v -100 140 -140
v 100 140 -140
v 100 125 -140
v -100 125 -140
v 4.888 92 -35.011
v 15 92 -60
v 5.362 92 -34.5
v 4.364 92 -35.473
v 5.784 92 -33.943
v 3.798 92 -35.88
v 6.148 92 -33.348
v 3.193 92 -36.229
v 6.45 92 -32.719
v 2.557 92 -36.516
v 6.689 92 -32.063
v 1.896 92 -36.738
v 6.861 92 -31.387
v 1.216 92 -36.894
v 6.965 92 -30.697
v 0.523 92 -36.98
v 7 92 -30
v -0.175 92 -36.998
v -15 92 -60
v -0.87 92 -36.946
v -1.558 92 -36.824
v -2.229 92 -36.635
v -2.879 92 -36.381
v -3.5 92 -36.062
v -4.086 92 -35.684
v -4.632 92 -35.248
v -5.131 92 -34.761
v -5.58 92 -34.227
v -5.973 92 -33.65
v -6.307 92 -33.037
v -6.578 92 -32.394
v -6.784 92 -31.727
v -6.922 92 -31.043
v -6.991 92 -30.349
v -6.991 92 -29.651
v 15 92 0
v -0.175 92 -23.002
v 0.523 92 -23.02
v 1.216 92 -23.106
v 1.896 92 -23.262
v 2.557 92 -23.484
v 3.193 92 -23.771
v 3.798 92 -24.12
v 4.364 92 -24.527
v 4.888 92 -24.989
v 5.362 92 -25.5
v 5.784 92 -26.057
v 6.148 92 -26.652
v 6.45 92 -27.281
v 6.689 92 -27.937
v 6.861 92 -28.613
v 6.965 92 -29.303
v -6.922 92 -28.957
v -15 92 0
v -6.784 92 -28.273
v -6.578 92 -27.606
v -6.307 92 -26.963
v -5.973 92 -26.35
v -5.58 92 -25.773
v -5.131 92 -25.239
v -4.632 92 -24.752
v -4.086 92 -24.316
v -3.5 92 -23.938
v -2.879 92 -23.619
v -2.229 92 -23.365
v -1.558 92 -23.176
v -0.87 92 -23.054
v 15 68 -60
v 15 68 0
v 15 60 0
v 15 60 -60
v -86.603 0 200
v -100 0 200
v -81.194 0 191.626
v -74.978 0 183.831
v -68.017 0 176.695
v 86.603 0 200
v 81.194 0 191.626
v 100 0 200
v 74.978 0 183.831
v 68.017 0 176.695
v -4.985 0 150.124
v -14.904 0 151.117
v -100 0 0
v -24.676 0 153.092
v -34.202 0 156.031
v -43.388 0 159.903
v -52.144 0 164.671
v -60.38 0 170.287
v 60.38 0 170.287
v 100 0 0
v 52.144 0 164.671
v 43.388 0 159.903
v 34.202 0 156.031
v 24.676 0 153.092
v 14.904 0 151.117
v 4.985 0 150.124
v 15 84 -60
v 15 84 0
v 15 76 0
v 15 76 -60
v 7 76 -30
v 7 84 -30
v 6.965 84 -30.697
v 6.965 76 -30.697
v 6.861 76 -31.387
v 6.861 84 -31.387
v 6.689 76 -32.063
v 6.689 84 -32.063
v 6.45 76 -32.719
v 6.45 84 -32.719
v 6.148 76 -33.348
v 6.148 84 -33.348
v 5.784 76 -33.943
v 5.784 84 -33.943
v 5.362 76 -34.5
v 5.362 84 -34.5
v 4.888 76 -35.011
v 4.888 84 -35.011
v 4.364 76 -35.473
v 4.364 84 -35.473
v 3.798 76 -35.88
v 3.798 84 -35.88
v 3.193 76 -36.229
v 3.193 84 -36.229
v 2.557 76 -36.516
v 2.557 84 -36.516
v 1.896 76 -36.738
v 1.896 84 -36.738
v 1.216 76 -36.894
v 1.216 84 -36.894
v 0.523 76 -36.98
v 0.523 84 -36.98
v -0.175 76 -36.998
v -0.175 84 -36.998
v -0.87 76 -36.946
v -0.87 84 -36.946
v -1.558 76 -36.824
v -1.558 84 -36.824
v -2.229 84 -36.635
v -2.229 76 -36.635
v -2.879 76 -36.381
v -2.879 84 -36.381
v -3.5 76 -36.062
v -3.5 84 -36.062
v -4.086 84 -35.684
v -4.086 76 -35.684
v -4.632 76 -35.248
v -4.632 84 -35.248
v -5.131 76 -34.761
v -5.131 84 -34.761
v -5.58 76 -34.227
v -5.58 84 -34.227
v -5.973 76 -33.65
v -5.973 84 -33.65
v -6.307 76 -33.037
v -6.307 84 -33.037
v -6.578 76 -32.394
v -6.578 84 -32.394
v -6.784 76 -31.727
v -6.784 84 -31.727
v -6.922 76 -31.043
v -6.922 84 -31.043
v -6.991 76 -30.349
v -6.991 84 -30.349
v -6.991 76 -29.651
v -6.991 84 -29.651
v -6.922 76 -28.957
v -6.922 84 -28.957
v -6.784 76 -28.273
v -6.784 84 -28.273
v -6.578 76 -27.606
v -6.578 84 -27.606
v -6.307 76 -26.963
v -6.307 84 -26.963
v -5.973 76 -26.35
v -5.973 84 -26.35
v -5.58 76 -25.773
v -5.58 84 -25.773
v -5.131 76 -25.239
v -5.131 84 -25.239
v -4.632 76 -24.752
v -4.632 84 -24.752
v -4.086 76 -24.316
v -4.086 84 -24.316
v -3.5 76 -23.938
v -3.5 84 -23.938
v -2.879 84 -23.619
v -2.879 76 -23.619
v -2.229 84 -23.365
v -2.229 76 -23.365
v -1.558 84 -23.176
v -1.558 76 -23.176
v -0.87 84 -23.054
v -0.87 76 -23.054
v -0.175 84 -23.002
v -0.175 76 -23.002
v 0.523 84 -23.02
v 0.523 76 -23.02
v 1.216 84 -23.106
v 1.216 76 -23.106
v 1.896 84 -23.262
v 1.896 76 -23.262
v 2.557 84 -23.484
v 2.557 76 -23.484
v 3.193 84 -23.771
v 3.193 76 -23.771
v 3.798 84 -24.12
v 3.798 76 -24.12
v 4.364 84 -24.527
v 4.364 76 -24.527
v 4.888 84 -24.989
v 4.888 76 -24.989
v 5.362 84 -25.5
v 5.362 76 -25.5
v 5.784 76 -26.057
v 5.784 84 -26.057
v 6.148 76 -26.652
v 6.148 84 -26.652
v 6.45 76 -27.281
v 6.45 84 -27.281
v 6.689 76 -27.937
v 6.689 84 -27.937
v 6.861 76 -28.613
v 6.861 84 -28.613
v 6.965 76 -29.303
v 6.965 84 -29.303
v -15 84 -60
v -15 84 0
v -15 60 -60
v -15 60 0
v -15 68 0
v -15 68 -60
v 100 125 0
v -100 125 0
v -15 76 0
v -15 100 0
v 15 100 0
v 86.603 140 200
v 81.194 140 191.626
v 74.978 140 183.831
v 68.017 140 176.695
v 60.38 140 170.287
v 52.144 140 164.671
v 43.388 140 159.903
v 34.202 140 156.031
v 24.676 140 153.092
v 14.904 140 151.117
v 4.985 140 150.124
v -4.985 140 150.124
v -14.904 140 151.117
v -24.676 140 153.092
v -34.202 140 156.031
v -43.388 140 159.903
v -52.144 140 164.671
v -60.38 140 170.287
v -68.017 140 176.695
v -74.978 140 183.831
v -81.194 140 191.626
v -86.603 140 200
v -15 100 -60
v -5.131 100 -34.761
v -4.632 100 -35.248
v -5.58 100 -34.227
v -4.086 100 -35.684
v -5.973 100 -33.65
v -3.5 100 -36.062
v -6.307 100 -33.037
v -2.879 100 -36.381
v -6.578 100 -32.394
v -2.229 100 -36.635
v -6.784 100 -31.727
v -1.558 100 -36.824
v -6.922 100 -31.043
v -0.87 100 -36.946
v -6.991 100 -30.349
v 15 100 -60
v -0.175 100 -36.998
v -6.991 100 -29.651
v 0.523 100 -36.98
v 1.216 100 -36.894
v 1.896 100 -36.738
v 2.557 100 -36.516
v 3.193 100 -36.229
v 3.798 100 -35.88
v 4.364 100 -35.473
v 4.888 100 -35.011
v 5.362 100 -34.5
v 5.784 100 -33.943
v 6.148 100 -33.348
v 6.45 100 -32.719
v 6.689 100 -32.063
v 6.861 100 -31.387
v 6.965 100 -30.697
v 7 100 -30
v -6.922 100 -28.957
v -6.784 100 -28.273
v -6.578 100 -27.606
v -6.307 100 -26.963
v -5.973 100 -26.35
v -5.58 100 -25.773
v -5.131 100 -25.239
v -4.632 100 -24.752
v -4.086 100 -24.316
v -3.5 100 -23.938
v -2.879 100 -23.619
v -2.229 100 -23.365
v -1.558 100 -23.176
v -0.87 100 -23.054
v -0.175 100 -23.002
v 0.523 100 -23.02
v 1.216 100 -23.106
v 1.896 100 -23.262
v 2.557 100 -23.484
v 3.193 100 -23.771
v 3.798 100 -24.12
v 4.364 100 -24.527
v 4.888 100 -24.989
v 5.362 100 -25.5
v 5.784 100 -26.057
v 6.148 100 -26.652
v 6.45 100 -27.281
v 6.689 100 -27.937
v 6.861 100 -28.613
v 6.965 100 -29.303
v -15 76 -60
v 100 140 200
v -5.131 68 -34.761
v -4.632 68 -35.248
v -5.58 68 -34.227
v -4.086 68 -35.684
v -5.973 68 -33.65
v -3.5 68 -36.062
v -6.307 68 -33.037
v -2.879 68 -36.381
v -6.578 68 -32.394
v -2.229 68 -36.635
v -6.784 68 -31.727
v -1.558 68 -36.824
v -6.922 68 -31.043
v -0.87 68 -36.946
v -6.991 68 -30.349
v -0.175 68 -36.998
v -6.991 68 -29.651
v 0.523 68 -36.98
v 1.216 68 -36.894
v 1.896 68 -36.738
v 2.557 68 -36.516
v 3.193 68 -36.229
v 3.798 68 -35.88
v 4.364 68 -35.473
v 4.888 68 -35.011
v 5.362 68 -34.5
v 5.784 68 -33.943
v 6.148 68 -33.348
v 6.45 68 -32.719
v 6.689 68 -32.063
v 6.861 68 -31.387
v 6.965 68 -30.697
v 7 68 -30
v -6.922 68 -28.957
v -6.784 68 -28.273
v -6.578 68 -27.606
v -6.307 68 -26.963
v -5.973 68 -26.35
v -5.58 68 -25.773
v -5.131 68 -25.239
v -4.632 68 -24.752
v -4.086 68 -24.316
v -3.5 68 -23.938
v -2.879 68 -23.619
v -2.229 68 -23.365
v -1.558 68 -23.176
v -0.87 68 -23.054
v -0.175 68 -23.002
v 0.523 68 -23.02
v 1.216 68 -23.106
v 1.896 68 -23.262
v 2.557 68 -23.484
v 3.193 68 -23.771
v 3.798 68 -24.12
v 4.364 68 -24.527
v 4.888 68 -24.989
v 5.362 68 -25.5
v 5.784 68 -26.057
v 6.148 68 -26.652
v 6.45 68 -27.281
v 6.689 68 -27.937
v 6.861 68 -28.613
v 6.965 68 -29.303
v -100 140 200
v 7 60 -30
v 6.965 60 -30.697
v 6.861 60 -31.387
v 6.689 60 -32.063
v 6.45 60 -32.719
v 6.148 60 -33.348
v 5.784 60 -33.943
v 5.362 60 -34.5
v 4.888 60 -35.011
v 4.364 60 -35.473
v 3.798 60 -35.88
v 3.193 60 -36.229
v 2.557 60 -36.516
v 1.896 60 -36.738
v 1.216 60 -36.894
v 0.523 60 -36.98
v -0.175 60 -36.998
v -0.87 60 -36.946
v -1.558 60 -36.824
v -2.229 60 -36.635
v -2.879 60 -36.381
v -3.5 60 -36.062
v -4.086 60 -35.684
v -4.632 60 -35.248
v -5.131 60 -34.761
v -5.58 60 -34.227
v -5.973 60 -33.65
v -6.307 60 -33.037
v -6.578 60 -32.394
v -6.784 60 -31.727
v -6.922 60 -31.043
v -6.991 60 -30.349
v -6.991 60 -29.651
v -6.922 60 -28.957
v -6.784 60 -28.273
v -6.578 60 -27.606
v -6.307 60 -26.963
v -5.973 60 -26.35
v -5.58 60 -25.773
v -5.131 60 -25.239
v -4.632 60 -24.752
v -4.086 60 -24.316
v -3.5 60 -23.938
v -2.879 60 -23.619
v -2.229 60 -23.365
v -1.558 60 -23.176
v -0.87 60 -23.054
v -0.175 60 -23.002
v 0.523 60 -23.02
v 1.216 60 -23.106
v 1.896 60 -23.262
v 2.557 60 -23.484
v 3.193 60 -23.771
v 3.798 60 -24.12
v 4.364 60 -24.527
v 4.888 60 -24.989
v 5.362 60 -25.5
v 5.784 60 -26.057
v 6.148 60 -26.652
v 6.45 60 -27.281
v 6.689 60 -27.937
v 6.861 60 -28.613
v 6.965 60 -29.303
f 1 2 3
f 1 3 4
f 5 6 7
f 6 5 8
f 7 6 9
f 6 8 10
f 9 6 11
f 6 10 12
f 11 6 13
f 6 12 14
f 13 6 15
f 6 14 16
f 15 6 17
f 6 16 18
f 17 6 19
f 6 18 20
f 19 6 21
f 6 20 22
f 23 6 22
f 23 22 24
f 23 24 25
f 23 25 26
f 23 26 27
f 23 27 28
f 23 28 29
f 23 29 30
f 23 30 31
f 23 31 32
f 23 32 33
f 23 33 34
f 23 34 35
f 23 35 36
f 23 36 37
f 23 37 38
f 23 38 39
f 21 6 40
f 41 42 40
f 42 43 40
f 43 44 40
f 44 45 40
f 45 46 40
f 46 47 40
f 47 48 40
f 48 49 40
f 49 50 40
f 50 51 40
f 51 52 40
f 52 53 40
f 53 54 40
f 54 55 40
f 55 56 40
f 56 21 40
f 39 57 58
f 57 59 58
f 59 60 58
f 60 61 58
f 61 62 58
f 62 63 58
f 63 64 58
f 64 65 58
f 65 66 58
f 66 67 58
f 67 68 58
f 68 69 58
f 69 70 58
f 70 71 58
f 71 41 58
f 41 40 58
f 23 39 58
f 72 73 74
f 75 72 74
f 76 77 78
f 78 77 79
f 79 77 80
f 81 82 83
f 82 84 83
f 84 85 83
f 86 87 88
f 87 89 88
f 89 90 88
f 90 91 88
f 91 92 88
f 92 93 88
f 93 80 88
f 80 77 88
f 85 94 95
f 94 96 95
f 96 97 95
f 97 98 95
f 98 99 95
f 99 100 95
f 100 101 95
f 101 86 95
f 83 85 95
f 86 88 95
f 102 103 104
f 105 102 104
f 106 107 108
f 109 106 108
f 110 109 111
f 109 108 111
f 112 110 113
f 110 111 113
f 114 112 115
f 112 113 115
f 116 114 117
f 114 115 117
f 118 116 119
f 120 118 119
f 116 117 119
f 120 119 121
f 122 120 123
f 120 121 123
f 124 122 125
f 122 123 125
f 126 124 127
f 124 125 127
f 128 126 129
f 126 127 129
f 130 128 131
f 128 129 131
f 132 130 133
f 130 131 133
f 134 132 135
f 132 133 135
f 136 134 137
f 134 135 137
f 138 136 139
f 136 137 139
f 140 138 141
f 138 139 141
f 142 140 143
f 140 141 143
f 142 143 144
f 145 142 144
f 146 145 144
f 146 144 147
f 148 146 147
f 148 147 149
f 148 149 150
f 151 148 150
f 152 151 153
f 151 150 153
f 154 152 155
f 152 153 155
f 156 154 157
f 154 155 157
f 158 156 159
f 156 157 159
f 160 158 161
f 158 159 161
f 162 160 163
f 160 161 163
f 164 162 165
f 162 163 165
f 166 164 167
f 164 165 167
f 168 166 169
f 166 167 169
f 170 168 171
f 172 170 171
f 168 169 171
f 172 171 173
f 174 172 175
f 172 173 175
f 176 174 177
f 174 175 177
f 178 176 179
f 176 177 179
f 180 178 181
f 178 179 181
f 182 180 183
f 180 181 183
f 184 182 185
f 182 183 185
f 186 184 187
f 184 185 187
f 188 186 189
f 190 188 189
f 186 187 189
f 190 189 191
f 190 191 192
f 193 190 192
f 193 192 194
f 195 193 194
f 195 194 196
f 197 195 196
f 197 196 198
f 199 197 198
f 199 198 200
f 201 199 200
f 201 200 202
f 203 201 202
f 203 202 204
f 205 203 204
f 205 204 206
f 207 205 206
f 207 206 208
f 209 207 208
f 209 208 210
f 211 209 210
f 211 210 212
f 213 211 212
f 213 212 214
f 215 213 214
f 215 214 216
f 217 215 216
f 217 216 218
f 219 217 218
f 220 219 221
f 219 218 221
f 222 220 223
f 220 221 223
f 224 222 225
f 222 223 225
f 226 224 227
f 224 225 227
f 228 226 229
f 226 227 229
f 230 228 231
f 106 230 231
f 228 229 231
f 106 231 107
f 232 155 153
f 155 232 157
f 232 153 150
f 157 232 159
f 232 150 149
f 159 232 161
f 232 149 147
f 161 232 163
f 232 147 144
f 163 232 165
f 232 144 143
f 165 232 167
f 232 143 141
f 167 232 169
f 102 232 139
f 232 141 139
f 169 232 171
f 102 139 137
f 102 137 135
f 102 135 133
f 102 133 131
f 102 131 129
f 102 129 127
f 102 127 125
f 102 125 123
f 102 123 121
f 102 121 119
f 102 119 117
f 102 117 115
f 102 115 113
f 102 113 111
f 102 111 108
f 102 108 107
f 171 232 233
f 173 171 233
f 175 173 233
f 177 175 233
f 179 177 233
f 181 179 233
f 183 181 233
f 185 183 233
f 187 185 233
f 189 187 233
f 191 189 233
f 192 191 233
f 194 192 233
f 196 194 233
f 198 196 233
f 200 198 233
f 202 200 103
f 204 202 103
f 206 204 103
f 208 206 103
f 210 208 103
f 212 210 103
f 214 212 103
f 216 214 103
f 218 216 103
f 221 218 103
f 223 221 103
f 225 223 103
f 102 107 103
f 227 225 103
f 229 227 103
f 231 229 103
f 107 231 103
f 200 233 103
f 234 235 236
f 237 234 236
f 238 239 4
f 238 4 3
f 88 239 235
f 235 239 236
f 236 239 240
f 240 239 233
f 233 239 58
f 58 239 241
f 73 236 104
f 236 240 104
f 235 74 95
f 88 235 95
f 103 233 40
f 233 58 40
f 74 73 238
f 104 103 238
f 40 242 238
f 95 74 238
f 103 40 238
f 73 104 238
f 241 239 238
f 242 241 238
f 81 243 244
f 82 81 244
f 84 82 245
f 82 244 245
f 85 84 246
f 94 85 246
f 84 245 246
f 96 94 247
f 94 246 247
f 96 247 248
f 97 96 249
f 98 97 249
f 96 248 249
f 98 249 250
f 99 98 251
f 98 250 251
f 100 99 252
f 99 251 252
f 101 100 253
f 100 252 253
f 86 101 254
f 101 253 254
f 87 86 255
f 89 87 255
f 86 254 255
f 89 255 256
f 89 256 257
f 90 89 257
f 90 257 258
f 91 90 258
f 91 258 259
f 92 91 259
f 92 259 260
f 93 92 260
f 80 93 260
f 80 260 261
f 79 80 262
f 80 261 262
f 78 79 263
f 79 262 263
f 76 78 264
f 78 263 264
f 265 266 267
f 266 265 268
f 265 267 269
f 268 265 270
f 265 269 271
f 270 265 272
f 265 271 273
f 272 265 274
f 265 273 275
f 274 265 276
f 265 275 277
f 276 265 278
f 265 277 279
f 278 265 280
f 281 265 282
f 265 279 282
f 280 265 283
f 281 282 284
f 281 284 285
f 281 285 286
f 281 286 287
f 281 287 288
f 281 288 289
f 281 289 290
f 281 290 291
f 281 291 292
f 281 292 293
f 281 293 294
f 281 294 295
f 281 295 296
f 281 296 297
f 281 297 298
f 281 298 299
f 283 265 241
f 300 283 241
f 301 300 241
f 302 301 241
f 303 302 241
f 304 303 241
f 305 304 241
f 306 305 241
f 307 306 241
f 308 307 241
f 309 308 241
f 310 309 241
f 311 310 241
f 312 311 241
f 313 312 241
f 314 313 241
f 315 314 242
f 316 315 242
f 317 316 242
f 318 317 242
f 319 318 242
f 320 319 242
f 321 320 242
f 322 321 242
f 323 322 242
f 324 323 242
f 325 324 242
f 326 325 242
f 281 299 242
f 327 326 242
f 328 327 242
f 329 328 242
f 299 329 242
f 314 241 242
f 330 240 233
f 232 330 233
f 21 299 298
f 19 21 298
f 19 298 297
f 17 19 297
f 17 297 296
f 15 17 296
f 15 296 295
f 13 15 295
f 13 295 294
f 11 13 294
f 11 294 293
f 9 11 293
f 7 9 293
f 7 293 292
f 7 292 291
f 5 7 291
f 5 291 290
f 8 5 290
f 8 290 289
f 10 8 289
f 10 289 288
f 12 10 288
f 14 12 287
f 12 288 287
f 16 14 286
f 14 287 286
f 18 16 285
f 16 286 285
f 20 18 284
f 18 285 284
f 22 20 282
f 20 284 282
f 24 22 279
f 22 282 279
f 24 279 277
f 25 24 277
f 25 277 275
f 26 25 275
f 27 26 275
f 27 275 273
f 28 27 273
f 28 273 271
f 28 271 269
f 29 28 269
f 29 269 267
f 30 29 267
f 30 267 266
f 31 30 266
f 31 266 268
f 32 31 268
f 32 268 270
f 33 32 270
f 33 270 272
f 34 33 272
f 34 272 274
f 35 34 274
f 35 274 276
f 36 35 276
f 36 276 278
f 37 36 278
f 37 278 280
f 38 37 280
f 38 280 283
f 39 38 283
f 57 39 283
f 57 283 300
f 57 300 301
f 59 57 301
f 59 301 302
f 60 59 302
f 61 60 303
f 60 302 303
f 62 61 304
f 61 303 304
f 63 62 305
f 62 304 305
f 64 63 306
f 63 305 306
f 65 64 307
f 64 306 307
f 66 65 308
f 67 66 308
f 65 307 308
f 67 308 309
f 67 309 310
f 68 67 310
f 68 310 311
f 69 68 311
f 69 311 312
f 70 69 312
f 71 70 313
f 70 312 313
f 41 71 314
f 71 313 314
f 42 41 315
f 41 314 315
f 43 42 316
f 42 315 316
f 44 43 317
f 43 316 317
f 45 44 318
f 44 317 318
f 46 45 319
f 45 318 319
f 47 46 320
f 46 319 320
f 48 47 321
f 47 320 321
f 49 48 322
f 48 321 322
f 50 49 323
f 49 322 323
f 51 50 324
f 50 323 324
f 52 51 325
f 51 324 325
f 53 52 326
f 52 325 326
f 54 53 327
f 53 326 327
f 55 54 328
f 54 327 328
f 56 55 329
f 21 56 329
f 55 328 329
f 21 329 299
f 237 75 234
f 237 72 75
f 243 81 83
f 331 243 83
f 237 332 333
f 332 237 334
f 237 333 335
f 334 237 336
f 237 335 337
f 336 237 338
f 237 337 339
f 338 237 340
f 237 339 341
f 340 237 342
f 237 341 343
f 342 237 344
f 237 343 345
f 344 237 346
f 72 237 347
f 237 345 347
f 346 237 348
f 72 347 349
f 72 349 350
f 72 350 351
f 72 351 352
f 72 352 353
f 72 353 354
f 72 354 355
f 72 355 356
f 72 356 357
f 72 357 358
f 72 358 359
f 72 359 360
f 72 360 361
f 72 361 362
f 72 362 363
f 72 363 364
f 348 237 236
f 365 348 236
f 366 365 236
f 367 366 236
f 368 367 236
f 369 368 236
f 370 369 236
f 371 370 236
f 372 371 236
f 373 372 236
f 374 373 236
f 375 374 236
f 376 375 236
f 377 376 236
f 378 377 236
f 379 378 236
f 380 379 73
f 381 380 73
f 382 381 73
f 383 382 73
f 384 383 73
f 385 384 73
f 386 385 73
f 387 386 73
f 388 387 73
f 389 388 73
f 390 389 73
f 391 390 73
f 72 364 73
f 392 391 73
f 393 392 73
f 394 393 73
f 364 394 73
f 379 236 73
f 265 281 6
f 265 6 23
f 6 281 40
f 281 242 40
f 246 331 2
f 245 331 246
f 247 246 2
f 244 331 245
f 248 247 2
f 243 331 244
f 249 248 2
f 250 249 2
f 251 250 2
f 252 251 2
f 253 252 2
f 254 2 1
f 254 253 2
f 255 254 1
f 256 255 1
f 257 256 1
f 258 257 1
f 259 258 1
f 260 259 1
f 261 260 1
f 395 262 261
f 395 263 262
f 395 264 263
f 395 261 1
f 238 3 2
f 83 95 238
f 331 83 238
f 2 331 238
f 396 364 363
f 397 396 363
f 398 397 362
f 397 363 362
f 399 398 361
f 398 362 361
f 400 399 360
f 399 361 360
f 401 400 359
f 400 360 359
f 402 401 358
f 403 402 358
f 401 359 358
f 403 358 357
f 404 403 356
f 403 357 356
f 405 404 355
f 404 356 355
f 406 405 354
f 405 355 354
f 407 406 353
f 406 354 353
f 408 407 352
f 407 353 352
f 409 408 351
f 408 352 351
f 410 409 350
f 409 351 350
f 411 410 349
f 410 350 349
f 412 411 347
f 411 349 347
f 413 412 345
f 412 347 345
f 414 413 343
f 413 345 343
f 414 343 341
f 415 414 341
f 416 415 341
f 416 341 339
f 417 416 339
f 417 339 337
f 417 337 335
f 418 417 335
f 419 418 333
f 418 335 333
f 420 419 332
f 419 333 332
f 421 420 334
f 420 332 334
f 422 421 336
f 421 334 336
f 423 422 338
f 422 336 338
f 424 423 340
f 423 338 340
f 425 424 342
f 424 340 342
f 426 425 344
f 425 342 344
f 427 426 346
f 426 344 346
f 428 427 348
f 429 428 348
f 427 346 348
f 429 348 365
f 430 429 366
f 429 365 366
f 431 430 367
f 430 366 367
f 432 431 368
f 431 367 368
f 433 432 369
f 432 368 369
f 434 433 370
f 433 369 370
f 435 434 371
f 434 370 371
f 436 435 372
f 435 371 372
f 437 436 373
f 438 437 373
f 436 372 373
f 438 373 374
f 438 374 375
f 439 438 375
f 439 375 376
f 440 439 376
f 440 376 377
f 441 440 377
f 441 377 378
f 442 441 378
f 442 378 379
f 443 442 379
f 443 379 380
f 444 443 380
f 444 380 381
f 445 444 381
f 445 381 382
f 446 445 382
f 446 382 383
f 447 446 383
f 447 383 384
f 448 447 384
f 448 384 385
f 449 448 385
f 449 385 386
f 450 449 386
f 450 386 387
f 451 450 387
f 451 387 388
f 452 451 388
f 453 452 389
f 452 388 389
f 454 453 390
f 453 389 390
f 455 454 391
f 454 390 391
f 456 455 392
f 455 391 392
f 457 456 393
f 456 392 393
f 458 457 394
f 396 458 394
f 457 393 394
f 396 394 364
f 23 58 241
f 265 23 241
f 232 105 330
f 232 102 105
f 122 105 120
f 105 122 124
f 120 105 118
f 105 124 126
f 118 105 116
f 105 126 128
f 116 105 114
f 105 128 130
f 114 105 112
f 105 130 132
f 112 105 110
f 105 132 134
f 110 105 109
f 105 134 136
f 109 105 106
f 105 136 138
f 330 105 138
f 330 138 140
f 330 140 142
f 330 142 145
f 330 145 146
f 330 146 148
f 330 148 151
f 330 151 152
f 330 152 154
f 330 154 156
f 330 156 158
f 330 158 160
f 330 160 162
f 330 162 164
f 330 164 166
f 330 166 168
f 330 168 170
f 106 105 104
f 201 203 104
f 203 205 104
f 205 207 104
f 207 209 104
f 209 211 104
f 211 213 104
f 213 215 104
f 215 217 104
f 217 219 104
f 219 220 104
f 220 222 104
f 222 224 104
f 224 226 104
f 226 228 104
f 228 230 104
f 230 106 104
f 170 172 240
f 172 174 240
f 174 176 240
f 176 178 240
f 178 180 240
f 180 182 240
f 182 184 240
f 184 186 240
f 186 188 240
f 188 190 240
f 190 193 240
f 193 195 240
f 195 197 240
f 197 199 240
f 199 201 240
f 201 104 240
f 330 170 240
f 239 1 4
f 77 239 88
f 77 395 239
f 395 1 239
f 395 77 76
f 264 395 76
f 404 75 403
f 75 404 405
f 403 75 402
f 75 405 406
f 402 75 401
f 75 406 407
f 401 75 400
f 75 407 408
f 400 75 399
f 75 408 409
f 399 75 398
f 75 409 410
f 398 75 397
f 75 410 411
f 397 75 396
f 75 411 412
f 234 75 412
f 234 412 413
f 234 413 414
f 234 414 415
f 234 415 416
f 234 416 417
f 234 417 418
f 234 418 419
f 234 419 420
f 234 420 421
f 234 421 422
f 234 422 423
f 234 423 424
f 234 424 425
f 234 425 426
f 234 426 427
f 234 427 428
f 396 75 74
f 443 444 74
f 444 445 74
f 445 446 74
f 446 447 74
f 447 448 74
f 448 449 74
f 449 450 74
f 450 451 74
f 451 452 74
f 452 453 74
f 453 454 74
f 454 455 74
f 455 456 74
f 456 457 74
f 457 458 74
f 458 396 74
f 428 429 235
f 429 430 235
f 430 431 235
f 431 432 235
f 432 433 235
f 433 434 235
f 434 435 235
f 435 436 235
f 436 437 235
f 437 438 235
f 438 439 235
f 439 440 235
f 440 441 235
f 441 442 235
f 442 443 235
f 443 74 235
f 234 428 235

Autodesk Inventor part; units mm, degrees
ref_plane "YZ Plane" through (0, 0, 0) normal (1, 0, 0) x (0, 1, 0)
ref_plane "XZ Plane" through (0, 0, 0) normal (0, 1, 0) x (-1, 0, 0)
ref_plane "XY Plane" through (0, 0, 0) normal (0, 0, 1) x (1, 0, 0)
sketch "Skizze1" plane through (0, 0, 0) normal (0, 0, 1) x (1, 0, 0)
  line L0 (-100, 0) -> (100, 0)
  line L1 (100, 0) -> (100, 140)
  line L2 (100, 140) -> (-100, 140)
  line L3 (-100, 140) -> (-100, 0)
  point P0 (0, 0)
  dimension "d0" = 200
  dimension "d1" = 140
extrude "Extrusion1" add sketch "Skizze1" along normal blind 200
sketch "Skizze2" plane through (-100, 140, 0) normal (0, 1, 0) x (1, 0, 0)
  circle A0 centre (100, -250) radius 100
  point P0 (100, 0)
  dimension "d4" = 200
extrude "Extrusion2" cut sketch "Skizze2" against normal blind 140
sketch "Skizze3" plane through (0, 0, 0) normal (0, 0, -1) x (-1, 0, 0)
  point P0 (0, 0)
sketch "Skizze4" plane through (0, 0, 0) normal (0, 0, -1) x (-1, 0, 0)
  line L0 (15, 68) -> (-15, 68)
  line L1 (-15, 68) -> (-15, 60)
  line L2 (-15, 60) -> (15, 60)
  line L3 (15, 60) -> (15, 68)
  line L4 (-15, 76) -> (15, 76)
  line L5 (15, 76) -> (15, 84)
  line L6 (15, 84) -> (-15, 84)
  line L7 (-15, 84) -> (-15, 76)
  line L8 (-15, 92) -> (15, 92)
  line L9 (15, 92) -> (15, 100)
  line L10 (15, 100) -> (-15, 100)
  line L11 (-15, 100) -> (-15, 92)
  point P0 (0, 0)
  dimension "d7" = 30
  dimension "d8" = 8
  dimension "d9" = 30
  dimension "d10" = 8
  dimension "d11" = 8
extrude "Extrusion3" add sketch "Skizze4" along normal blind 60
sketch "Skizze5" plane through (-15, 100, 0) normal (0, 1, 0) x (1, 0, 0)
  circle A0 centre (15, 30) radius 7
  line L0 (0, 60) -> (30, 60) projected
  arc A1 (30, 60) -> (0, 60) centre (15, 60) ccw
  point P0 (15, 0)
  dimension "d14" = 14
  dimension "d15" = 15
extrude "Extrusion4" cut sketch "Skizze5" against normal blind 40 contours A0
sketch "Skizze6" plane through (0, 0, 0) normal (0, 0, -1) x (-1, 0, 0)
  line L0 (-100, 0) -> (-100, 140) projected
  line L1 (100, 140) -> (100, 0) projected
  line L2 (-100, 140) -> (100, 140)
  line L3 (100, 140) -> (100, 125)
  line L4 (100, 125) -> (-100, 125)
  line L5 (-100, 125) -> (-100, 140)
  point P0 (0, 0)
  dimension "d18" = 15
extrude "Extrusion5" add sketch "Skizze6" along normal blind 140
properties part number "Ausschub_Magazin"
